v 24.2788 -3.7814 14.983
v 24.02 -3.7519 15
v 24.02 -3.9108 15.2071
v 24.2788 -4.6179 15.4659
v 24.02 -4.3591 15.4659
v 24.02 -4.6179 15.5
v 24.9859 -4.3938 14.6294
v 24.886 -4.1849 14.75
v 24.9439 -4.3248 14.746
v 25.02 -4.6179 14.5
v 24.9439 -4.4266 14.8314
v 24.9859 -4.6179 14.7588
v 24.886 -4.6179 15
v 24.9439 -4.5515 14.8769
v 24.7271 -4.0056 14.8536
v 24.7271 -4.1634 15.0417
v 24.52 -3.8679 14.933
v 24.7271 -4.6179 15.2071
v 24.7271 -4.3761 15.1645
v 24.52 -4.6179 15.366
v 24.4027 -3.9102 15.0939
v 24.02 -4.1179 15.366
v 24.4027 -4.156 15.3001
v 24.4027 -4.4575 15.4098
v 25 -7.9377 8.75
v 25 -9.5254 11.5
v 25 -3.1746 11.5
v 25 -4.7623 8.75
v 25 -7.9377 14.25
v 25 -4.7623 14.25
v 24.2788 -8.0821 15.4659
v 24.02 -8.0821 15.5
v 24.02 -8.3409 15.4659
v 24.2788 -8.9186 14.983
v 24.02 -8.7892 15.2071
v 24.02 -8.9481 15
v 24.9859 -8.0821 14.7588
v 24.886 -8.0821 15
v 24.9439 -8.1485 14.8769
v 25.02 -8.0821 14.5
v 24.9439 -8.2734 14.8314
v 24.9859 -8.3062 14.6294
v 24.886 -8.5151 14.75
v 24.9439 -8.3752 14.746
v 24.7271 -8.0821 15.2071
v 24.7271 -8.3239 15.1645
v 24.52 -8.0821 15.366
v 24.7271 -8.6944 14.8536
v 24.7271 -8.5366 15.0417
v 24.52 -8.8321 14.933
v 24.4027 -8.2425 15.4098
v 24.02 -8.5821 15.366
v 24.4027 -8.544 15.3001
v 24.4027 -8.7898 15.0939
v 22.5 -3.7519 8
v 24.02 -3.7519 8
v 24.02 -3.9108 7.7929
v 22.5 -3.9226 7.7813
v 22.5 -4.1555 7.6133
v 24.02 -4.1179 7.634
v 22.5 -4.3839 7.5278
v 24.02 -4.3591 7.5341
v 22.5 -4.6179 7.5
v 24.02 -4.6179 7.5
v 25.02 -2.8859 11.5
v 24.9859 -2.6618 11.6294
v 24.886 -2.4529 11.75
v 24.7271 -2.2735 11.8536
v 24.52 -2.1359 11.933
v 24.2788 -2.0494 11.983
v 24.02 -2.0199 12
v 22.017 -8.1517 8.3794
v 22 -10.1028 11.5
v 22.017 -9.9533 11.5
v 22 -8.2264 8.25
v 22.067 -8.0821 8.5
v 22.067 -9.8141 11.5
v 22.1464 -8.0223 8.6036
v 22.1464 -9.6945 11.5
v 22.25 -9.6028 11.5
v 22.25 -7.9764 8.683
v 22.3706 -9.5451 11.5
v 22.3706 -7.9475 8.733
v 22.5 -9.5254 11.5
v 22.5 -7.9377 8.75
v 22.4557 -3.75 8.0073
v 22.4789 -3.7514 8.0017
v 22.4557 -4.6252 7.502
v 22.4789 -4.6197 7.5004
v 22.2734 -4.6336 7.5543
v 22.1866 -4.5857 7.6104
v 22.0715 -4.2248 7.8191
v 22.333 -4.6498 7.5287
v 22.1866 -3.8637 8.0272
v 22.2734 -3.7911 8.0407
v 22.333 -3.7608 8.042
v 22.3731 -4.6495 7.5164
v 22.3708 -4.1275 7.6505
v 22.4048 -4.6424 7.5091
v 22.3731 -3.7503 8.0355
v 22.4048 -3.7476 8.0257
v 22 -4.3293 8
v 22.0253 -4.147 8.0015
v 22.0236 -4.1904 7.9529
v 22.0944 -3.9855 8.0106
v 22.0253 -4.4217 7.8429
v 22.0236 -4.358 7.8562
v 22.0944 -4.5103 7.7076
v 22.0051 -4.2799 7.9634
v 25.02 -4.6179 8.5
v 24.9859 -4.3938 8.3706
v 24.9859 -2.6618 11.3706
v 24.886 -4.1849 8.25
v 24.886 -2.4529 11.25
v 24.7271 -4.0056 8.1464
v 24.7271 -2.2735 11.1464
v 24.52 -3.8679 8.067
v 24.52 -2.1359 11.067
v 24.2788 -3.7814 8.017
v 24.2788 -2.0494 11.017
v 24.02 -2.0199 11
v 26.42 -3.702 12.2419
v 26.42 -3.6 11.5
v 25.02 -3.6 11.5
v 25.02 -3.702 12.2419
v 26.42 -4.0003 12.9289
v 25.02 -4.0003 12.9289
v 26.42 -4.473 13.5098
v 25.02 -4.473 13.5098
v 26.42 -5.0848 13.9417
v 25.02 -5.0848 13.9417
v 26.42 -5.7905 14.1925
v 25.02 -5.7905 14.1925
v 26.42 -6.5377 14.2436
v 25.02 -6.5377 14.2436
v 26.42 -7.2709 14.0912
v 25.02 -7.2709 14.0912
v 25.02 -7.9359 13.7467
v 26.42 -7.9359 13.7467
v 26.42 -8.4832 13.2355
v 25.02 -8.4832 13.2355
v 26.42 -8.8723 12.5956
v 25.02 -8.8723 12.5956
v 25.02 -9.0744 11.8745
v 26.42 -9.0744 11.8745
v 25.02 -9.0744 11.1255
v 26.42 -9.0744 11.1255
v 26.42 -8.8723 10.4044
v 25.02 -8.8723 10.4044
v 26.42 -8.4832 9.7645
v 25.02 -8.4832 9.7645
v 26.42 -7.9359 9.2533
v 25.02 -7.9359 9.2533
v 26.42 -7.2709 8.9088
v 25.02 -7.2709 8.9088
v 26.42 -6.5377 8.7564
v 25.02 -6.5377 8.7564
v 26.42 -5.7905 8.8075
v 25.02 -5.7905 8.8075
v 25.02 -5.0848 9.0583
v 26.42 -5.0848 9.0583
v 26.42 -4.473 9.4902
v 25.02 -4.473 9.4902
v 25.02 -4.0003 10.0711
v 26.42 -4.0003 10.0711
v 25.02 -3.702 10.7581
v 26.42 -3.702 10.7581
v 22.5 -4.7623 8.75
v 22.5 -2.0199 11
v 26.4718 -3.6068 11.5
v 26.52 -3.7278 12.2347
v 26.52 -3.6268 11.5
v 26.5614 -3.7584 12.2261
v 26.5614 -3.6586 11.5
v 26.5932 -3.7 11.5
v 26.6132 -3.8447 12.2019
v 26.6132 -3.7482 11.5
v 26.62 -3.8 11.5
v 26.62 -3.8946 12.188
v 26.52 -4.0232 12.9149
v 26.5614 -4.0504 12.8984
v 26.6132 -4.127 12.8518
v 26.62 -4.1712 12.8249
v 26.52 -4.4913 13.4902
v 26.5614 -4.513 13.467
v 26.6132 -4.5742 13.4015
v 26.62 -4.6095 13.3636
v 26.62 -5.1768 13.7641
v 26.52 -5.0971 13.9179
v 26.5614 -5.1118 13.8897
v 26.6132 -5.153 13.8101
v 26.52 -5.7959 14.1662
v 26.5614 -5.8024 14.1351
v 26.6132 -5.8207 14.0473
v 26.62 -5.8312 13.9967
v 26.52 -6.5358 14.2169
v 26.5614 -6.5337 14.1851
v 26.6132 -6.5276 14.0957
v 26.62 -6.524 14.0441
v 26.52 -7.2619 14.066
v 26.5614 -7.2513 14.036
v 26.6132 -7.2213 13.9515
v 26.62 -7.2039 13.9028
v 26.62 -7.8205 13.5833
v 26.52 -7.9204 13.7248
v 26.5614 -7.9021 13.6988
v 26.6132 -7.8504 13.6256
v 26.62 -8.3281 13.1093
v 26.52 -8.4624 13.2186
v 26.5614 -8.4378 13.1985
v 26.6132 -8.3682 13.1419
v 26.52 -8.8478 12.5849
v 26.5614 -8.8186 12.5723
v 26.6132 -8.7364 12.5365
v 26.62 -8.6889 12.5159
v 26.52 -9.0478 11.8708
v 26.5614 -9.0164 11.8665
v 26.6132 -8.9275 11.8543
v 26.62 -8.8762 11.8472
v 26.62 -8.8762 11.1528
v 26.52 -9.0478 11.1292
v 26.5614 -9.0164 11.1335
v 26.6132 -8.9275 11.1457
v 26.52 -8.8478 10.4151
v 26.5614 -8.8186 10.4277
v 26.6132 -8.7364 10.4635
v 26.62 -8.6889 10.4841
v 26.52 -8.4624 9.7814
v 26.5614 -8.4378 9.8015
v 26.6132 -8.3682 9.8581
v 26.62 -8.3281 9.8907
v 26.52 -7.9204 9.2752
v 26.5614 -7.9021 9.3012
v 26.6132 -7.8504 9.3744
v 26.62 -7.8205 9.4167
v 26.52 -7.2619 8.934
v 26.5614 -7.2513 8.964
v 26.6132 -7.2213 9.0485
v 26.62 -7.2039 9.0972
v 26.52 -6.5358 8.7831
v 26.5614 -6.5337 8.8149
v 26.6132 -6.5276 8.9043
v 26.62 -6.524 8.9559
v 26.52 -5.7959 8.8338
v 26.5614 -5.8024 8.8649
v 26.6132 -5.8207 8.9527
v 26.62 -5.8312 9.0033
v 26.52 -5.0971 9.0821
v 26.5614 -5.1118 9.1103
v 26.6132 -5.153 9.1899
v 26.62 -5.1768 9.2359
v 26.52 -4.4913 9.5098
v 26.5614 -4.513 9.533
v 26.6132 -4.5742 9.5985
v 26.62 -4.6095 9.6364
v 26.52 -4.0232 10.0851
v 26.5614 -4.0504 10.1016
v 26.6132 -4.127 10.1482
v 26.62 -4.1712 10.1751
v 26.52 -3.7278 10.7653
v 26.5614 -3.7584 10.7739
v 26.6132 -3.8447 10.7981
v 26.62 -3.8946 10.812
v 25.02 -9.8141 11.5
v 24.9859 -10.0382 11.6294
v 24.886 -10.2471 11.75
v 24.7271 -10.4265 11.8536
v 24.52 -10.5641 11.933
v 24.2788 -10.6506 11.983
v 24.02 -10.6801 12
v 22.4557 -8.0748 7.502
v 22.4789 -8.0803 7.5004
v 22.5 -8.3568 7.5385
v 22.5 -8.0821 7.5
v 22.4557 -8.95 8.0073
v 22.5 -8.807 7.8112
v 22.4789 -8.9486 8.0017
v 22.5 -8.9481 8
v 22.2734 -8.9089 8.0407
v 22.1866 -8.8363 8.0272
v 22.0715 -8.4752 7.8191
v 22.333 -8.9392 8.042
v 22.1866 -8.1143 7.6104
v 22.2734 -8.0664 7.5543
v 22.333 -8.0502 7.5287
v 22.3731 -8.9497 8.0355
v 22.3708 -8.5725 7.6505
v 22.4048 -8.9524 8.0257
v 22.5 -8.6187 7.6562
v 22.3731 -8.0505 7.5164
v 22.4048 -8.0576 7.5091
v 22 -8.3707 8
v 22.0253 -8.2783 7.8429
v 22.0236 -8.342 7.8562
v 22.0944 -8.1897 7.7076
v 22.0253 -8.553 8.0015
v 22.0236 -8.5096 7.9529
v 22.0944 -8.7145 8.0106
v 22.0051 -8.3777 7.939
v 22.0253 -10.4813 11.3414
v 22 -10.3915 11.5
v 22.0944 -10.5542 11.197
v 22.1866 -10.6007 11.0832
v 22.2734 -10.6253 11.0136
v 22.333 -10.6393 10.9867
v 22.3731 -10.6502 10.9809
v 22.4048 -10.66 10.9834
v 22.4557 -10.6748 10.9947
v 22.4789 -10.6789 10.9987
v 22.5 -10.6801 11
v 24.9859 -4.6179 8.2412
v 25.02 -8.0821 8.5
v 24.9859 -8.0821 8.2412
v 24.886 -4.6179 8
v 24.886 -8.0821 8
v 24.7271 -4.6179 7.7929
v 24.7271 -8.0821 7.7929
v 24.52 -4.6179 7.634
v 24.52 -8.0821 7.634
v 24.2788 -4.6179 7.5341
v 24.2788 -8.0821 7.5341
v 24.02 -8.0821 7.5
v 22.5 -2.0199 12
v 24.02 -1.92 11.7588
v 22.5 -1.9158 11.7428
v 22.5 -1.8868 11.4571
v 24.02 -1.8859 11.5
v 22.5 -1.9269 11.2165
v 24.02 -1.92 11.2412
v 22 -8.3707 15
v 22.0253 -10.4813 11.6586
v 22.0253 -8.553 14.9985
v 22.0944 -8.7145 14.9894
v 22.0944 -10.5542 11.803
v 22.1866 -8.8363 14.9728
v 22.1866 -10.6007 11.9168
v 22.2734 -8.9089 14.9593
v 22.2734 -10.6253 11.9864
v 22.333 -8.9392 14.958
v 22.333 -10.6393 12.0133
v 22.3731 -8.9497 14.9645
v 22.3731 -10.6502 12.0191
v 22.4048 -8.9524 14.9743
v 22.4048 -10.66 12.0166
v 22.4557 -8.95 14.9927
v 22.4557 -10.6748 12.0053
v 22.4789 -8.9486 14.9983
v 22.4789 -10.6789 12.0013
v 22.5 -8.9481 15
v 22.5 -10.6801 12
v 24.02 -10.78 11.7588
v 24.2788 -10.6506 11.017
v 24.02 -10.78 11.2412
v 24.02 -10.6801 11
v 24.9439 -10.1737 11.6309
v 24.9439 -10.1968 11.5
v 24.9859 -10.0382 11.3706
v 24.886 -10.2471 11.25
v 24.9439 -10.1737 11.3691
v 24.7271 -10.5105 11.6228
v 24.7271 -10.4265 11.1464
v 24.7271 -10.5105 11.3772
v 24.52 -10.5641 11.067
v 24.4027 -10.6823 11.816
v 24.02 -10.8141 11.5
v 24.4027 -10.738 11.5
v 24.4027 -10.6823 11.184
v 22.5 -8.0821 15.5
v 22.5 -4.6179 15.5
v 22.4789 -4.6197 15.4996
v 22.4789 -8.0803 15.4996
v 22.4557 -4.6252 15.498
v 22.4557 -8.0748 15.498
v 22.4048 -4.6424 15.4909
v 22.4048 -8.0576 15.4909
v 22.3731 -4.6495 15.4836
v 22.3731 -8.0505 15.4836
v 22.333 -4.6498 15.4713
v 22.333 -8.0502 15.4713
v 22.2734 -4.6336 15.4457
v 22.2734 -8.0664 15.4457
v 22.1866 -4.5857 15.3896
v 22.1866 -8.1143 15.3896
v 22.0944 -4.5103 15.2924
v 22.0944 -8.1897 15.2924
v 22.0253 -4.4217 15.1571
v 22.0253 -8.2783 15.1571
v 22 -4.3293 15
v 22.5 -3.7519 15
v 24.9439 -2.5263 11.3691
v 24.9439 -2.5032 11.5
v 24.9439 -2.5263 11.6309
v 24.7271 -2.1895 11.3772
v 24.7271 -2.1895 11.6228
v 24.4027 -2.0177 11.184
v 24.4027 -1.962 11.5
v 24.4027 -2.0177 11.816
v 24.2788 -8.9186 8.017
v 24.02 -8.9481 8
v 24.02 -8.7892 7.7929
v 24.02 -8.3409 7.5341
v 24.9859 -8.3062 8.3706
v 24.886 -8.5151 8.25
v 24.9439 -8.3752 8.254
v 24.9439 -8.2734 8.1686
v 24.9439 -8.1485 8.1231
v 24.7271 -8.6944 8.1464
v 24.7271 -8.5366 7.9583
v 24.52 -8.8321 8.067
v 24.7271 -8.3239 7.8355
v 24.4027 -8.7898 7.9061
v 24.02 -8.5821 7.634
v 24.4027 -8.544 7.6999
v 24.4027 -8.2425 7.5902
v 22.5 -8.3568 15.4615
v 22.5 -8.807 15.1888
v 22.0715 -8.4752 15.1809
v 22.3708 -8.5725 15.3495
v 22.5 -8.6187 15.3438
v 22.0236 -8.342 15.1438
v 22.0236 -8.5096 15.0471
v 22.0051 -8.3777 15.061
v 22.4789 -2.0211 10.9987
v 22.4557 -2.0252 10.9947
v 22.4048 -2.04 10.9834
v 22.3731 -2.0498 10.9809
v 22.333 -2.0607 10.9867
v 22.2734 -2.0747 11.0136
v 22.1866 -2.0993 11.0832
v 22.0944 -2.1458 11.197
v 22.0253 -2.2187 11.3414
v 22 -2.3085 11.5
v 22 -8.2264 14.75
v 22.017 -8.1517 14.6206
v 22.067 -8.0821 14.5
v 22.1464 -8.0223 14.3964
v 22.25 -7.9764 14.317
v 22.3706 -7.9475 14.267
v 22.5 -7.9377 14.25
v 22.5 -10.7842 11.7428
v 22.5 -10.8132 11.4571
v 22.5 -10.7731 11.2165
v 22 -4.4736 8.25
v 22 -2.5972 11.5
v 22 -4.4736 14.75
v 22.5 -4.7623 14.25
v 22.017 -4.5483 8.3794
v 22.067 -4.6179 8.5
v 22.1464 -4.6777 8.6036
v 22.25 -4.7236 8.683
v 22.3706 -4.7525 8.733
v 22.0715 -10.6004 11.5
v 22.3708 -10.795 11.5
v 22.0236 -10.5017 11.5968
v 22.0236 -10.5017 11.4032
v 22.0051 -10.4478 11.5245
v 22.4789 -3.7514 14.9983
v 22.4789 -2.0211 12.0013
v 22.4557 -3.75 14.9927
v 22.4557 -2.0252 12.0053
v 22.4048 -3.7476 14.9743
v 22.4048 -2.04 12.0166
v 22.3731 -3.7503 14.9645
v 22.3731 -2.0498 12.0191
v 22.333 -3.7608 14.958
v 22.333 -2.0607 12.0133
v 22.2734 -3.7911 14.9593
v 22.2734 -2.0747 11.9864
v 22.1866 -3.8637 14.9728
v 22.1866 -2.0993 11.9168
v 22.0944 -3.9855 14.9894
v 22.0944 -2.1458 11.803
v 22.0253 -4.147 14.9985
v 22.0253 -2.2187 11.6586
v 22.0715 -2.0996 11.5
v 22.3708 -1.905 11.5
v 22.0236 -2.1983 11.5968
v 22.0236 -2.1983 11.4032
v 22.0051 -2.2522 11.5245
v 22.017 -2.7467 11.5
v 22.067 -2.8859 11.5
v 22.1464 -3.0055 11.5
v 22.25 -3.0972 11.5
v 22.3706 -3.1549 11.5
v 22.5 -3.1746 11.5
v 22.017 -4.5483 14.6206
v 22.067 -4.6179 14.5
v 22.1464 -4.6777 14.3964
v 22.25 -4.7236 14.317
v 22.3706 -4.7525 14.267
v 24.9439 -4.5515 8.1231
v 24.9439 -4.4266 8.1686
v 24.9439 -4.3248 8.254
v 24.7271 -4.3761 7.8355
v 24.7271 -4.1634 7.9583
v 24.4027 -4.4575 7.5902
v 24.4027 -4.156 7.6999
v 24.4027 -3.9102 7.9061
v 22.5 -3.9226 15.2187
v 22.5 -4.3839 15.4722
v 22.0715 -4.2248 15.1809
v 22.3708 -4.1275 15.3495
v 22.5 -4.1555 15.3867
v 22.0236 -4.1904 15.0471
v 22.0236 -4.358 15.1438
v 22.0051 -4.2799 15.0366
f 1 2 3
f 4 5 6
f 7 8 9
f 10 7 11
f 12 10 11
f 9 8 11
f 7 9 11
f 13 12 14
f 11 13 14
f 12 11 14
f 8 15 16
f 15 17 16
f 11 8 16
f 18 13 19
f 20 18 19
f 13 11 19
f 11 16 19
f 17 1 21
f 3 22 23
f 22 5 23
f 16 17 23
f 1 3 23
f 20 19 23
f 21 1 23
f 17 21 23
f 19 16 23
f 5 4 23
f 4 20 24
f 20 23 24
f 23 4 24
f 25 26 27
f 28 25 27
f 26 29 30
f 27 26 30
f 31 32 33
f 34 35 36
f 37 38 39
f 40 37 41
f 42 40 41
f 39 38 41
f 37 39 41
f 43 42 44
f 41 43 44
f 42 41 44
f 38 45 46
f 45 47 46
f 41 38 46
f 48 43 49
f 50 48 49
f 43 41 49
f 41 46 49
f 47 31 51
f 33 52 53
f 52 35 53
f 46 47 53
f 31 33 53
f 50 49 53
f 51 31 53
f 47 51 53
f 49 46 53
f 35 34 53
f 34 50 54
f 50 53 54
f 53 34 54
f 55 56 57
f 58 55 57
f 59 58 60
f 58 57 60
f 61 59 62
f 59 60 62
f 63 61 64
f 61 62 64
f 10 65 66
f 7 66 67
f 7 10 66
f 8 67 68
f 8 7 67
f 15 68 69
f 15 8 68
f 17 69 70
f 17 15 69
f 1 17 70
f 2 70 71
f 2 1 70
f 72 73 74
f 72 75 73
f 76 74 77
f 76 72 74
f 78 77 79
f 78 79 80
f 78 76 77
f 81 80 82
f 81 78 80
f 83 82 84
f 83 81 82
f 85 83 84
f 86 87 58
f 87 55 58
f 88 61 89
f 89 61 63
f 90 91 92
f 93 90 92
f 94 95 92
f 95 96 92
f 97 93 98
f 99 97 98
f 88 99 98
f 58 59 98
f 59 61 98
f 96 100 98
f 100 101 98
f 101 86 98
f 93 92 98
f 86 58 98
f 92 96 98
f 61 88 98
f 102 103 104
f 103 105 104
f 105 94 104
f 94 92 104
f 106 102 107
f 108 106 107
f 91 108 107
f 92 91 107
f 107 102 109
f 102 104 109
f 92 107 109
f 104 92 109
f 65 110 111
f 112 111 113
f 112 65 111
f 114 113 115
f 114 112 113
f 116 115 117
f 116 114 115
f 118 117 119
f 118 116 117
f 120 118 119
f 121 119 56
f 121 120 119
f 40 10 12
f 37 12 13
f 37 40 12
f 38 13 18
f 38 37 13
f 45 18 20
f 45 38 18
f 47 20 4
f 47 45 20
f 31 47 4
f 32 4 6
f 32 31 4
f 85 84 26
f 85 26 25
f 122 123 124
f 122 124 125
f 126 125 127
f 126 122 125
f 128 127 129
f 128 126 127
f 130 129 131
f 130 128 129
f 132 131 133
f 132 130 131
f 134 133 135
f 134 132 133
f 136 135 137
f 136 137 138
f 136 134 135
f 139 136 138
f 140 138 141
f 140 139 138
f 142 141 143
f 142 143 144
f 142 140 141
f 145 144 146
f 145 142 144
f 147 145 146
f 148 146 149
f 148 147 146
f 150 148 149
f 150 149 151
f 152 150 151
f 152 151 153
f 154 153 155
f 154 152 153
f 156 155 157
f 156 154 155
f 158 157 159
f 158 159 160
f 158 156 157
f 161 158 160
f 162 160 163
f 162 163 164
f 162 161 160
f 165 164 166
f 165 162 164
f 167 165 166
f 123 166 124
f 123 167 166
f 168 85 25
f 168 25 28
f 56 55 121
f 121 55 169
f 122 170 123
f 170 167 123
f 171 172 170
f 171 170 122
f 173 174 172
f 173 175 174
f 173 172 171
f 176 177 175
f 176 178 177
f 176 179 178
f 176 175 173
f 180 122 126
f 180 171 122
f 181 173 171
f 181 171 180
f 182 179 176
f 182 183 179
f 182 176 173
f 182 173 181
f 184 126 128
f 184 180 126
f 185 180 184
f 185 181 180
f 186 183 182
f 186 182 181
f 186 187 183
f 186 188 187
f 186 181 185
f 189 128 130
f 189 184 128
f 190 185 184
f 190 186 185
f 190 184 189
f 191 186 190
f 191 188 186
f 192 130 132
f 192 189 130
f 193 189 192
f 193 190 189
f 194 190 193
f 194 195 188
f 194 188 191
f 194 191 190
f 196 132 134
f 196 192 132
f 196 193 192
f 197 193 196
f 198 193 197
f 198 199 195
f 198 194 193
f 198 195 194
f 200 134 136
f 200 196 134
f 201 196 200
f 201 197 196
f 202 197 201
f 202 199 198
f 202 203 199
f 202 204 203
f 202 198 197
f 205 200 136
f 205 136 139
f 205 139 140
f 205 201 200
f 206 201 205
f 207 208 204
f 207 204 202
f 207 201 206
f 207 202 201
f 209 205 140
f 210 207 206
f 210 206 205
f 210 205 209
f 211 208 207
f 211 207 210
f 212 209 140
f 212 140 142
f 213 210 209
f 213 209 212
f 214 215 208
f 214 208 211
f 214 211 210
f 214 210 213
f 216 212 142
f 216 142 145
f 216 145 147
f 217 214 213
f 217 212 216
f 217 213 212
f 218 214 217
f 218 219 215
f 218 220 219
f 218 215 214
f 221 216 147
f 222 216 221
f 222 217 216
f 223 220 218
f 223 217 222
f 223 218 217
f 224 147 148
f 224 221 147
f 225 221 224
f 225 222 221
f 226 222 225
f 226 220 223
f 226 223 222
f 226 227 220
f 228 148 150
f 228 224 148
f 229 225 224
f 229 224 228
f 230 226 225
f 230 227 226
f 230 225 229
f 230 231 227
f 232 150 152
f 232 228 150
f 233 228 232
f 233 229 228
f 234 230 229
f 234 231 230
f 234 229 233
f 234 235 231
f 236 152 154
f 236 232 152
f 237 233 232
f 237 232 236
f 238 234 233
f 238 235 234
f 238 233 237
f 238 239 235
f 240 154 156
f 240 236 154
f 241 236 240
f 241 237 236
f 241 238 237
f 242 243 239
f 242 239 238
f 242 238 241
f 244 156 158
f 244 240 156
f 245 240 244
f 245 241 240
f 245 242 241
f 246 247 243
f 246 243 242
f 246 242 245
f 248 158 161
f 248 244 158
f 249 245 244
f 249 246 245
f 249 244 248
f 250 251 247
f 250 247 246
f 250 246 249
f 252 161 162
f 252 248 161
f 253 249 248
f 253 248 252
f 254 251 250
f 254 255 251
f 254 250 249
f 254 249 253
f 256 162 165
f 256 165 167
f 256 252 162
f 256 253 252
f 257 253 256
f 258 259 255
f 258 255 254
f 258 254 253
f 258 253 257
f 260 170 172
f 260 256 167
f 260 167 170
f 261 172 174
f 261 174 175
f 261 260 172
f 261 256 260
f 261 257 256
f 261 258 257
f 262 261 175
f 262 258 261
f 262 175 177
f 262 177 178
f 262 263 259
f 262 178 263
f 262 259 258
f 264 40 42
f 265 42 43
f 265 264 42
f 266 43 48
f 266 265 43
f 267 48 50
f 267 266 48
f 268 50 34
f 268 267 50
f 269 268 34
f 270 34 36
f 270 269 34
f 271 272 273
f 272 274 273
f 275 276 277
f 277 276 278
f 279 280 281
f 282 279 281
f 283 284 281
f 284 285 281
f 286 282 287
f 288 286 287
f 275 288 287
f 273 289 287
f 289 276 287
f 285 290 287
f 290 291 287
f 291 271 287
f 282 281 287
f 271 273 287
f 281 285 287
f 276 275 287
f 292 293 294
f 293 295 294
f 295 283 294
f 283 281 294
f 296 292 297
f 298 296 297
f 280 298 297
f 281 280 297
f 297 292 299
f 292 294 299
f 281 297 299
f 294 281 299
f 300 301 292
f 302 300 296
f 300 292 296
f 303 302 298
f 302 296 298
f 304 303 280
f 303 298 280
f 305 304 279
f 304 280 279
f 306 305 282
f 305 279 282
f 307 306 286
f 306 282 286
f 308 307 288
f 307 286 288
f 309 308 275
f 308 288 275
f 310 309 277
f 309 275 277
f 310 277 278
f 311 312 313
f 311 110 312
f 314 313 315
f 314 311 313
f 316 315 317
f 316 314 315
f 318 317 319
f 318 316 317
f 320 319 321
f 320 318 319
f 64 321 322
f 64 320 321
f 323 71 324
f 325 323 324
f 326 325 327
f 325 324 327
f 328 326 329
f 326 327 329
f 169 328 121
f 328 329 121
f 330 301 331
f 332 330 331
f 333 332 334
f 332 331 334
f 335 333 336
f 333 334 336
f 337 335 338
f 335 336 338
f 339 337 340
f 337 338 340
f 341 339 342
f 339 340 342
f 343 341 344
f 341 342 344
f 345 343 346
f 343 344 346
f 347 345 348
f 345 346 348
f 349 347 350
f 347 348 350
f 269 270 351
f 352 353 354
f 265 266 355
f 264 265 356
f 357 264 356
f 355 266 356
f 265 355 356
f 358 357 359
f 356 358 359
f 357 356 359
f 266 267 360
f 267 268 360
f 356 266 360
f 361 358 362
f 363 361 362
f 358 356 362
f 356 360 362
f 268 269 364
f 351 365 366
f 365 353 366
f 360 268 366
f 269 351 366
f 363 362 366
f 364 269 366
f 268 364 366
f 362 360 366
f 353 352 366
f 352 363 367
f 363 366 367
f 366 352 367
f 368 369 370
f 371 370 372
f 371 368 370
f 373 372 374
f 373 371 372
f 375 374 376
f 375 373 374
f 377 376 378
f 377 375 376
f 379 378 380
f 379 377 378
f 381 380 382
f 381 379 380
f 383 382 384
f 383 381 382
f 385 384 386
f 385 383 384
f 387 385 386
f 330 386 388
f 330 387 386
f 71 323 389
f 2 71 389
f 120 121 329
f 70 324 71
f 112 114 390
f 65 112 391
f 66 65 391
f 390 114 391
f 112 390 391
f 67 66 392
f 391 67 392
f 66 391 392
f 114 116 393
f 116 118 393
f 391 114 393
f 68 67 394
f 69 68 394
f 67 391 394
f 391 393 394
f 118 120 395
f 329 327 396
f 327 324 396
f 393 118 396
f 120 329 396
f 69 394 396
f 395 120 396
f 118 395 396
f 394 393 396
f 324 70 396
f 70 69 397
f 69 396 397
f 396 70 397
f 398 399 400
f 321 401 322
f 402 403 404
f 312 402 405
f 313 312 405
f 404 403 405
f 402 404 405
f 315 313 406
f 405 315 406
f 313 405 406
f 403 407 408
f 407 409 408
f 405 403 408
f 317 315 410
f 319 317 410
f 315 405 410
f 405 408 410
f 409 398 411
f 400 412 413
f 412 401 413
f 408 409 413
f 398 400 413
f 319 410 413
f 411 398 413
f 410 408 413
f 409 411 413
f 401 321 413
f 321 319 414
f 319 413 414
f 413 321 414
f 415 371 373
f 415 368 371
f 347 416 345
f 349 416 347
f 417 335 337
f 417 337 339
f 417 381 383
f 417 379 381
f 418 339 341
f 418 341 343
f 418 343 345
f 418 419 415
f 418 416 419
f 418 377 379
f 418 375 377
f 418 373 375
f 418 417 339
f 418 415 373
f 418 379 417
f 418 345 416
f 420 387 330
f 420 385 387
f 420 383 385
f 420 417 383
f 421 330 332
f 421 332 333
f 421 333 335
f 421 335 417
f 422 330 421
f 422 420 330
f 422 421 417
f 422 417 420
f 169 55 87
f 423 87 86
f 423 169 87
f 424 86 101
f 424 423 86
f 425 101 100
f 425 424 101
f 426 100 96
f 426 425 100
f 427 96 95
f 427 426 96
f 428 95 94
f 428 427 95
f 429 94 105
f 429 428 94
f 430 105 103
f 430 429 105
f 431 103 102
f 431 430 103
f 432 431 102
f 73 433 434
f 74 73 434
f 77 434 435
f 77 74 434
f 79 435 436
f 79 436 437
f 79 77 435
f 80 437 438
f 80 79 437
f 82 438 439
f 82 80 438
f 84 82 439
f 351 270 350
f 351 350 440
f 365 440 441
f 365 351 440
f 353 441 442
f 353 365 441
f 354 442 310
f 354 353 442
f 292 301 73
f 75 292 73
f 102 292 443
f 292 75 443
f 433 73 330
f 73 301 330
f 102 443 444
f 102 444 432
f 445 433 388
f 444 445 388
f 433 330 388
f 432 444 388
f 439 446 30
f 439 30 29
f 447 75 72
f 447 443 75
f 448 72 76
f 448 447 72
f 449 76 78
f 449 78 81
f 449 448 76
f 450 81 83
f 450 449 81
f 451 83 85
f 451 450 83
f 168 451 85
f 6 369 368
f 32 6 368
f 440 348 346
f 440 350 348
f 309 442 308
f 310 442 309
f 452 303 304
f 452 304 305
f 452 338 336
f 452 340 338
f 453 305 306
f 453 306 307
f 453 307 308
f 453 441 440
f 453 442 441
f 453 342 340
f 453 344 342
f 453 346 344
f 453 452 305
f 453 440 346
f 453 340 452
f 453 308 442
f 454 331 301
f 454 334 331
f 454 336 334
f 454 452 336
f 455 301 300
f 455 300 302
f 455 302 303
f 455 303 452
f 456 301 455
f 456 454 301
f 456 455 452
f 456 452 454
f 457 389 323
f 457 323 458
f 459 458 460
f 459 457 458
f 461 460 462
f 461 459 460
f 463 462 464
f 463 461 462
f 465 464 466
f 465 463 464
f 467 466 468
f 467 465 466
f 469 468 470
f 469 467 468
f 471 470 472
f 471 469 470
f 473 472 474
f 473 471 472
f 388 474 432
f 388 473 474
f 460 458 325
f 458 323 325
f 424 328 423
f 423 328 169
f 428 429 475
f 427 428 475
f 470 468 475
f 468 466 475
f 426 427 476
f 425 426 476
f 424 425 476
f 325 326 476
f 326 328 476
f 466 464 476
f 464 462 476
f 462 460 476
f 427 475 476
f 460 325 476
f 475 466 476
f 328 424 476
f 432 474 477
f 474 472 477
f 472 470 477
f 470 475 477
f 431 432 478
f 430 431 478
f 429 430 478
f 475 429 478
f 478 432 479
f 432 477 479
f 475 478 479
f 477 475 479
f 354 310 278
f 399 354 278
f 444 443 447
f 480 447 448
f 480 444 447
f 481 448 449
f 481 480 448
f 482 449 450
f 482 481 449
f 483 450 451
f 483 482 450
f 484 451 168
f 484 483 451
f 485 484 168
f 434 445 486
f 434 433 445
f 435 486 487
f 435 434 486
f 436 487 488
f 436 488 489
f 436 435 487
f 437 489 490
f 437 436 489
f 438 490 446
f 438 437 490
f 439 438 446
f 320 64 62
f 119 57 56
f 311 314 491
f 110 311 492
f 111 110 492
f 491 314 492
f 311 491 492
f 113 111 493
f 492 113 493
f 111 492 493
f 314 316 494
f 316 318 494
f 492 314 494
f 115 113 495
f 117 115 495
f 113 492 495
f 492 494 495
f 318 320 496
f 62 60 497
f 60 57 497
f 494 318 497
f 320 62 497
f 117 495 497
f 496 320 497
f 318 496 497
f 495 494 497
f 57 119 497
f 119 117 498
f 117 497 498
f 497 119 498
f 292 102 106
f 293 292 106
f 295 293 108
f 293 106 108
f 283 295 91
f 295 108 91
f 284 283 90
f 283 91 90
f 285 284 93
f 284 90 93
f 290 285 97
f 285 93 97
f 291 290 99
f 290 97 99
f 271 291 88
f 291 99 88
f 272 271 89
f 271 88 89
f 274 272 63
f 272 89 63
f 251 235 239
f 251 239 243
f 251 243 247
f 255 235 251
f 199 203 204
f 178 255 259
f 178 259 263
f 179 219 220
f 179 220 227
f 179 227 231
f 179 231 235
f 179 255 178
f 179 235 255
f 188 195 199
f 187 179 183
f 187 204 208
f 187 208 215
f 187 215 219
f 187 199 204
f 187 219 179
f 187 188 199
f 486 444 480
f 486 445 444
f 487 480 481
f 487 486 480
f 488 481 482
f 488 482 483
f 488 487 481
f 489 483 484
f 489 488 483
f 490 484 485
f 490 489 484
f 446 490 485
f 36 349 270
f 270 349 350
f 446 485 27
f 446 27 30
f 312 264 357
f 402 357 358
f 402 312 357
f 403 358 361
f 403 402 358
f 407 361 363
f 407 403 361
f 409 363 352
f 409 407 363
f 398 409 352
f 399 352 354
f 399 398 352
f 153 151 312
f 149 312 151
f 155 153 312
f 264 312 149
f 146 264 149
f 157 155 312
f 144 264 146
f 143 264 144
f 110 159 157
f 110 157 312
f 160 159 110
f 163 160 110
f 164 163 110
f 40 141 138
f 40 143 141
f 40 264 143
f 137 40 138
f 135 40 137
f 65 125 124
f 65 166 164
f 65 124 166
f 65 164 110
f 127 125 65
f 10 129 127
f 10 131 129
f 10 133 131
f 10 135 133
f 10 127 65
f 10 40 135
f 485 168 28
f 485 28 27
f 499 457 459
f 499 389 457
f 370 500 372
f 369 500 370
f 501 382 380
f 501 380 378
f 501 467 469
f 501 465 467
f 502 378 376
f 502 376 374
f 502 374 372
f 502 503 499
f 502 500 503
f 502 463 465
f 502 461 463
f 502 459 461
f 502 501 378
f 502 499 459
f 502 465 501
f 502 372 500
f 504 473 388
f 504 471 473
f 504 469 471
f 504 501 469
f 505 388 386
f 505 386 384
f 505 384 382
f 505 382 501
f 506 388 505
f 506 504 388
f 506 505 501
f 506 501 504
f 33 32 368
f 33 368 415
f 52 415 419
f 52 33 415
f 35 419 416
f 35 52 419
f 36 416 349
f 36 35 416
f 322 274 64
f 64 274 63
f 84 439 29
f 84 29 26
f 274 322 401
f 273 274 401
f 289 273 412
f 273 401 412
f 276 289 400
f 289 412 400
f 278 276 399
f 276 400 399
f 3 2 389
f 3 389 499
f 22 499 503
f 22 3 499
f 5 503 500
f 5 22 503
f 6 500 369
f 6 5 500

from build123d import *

# Parameters (mm, degrees)
PAD005_DEPTH    = 4.62
POCKET004_DEPTH = 3
FILLET_R        = 0.5
FILLET001_R     = 1
SKETCH011_R     = 2.75
POCKET005_DEPTH = 1.6
FILLET002_R     = 1
FILLET003_R     = 0.2


with BuildPart() as part:
    # Sketch009 → Pad005 (new body)
    with BuildSketch(Plane.YZ):
        Polygon((4.618802, 0), (2.309401, 4), (-2.309401, 4), (-4.618802, 0), (-2.309401, -4), (2.309401, -4), align=None)
    extrude(amount=PAD005_DEPTH)

    # Sketch010 → Pocket004 (cut)
    with BuildSketch(Plane.YZ):
        Polygon((3.175426, 0), (1.587713, 2.75), (-1.587713, 2.75), (-3.175426, 0), (-1.587713, -2.75), (1.587713, -2.75), align=None)
    extrude(amount=POCKET004_DEPTH, mode=Mode.SUBTRACT)

    # Fillet
    fillet_edges = [part.edges().sort_by_distance(p)[0] for p in [
        (0, 3.464102, -2),
        (0, 3.464102, 2),
        (0, 0, 4),
        (0, -3.464102, 2),
        (0, -3.464102, -2),
        (0, 0, -4),
        (0, 2.38157, -1.375),
        (0, 2.38157, 1.375),
        (0, 0, 2.75),
        (0, -2.38157, 1.375),
        (0, -2.38157, -1.375),
        (0, 0, -2.75),
    ]]
    fillet(fillet_edges, radius=FILLET_R)

    # Fillet001
    fillet001_edges = [part.edges().sort_by_distance(p)[0] for p in [
        (2.56, 4.618802, 0),
        (2.56, 2.309401, 4),
        (2.56, -2.309401, 4),
        (2.56, 2.309401, -4),
        (2.56, -2.309401, -4),
        (2.56, -4.618802, 0),
    ]]
    fillet(fillet001_edges, radius=FILLET001_R)

    # Sketch011 (on Face5 of Fillet001) → Pocket005 (cut)
    with BuildSketch(Plane.YZ.offset(4.62)):
        Polygon((4.618802, 0), (2.309401, 4), (-2.309401, 4), (-4.618802, 0), (-2.309401, -4), (2.309401, -4), align=None)
        Circle(SKETCH011_R, mode=Mode.SUBTRACT)
    extrude(amount=-POCKET005_DEPTH, mode=Mode.SUBTRACT)

    # Fillet002
    fillet002_edges = [part.edges().sort_by_distance(p)[0] for p in [
        (3.02, 0, -4),
    ]]
    fillet(fillet002_edges, radius=FILLET002_R)

    # Fillet003
    fillet003_edges = [part.edges().sort_by_distance(p)[0] for p in [
        (4.62, -2.75, 0),
    ]]
    fillet(fillet003_edges, radius=FILLET003_R)


with BuildPart() as part_1:
    # Body001 placement: moved
    add(part.part.moved(Location((22, -6.35, 11.5))))


solid = part_1.part
